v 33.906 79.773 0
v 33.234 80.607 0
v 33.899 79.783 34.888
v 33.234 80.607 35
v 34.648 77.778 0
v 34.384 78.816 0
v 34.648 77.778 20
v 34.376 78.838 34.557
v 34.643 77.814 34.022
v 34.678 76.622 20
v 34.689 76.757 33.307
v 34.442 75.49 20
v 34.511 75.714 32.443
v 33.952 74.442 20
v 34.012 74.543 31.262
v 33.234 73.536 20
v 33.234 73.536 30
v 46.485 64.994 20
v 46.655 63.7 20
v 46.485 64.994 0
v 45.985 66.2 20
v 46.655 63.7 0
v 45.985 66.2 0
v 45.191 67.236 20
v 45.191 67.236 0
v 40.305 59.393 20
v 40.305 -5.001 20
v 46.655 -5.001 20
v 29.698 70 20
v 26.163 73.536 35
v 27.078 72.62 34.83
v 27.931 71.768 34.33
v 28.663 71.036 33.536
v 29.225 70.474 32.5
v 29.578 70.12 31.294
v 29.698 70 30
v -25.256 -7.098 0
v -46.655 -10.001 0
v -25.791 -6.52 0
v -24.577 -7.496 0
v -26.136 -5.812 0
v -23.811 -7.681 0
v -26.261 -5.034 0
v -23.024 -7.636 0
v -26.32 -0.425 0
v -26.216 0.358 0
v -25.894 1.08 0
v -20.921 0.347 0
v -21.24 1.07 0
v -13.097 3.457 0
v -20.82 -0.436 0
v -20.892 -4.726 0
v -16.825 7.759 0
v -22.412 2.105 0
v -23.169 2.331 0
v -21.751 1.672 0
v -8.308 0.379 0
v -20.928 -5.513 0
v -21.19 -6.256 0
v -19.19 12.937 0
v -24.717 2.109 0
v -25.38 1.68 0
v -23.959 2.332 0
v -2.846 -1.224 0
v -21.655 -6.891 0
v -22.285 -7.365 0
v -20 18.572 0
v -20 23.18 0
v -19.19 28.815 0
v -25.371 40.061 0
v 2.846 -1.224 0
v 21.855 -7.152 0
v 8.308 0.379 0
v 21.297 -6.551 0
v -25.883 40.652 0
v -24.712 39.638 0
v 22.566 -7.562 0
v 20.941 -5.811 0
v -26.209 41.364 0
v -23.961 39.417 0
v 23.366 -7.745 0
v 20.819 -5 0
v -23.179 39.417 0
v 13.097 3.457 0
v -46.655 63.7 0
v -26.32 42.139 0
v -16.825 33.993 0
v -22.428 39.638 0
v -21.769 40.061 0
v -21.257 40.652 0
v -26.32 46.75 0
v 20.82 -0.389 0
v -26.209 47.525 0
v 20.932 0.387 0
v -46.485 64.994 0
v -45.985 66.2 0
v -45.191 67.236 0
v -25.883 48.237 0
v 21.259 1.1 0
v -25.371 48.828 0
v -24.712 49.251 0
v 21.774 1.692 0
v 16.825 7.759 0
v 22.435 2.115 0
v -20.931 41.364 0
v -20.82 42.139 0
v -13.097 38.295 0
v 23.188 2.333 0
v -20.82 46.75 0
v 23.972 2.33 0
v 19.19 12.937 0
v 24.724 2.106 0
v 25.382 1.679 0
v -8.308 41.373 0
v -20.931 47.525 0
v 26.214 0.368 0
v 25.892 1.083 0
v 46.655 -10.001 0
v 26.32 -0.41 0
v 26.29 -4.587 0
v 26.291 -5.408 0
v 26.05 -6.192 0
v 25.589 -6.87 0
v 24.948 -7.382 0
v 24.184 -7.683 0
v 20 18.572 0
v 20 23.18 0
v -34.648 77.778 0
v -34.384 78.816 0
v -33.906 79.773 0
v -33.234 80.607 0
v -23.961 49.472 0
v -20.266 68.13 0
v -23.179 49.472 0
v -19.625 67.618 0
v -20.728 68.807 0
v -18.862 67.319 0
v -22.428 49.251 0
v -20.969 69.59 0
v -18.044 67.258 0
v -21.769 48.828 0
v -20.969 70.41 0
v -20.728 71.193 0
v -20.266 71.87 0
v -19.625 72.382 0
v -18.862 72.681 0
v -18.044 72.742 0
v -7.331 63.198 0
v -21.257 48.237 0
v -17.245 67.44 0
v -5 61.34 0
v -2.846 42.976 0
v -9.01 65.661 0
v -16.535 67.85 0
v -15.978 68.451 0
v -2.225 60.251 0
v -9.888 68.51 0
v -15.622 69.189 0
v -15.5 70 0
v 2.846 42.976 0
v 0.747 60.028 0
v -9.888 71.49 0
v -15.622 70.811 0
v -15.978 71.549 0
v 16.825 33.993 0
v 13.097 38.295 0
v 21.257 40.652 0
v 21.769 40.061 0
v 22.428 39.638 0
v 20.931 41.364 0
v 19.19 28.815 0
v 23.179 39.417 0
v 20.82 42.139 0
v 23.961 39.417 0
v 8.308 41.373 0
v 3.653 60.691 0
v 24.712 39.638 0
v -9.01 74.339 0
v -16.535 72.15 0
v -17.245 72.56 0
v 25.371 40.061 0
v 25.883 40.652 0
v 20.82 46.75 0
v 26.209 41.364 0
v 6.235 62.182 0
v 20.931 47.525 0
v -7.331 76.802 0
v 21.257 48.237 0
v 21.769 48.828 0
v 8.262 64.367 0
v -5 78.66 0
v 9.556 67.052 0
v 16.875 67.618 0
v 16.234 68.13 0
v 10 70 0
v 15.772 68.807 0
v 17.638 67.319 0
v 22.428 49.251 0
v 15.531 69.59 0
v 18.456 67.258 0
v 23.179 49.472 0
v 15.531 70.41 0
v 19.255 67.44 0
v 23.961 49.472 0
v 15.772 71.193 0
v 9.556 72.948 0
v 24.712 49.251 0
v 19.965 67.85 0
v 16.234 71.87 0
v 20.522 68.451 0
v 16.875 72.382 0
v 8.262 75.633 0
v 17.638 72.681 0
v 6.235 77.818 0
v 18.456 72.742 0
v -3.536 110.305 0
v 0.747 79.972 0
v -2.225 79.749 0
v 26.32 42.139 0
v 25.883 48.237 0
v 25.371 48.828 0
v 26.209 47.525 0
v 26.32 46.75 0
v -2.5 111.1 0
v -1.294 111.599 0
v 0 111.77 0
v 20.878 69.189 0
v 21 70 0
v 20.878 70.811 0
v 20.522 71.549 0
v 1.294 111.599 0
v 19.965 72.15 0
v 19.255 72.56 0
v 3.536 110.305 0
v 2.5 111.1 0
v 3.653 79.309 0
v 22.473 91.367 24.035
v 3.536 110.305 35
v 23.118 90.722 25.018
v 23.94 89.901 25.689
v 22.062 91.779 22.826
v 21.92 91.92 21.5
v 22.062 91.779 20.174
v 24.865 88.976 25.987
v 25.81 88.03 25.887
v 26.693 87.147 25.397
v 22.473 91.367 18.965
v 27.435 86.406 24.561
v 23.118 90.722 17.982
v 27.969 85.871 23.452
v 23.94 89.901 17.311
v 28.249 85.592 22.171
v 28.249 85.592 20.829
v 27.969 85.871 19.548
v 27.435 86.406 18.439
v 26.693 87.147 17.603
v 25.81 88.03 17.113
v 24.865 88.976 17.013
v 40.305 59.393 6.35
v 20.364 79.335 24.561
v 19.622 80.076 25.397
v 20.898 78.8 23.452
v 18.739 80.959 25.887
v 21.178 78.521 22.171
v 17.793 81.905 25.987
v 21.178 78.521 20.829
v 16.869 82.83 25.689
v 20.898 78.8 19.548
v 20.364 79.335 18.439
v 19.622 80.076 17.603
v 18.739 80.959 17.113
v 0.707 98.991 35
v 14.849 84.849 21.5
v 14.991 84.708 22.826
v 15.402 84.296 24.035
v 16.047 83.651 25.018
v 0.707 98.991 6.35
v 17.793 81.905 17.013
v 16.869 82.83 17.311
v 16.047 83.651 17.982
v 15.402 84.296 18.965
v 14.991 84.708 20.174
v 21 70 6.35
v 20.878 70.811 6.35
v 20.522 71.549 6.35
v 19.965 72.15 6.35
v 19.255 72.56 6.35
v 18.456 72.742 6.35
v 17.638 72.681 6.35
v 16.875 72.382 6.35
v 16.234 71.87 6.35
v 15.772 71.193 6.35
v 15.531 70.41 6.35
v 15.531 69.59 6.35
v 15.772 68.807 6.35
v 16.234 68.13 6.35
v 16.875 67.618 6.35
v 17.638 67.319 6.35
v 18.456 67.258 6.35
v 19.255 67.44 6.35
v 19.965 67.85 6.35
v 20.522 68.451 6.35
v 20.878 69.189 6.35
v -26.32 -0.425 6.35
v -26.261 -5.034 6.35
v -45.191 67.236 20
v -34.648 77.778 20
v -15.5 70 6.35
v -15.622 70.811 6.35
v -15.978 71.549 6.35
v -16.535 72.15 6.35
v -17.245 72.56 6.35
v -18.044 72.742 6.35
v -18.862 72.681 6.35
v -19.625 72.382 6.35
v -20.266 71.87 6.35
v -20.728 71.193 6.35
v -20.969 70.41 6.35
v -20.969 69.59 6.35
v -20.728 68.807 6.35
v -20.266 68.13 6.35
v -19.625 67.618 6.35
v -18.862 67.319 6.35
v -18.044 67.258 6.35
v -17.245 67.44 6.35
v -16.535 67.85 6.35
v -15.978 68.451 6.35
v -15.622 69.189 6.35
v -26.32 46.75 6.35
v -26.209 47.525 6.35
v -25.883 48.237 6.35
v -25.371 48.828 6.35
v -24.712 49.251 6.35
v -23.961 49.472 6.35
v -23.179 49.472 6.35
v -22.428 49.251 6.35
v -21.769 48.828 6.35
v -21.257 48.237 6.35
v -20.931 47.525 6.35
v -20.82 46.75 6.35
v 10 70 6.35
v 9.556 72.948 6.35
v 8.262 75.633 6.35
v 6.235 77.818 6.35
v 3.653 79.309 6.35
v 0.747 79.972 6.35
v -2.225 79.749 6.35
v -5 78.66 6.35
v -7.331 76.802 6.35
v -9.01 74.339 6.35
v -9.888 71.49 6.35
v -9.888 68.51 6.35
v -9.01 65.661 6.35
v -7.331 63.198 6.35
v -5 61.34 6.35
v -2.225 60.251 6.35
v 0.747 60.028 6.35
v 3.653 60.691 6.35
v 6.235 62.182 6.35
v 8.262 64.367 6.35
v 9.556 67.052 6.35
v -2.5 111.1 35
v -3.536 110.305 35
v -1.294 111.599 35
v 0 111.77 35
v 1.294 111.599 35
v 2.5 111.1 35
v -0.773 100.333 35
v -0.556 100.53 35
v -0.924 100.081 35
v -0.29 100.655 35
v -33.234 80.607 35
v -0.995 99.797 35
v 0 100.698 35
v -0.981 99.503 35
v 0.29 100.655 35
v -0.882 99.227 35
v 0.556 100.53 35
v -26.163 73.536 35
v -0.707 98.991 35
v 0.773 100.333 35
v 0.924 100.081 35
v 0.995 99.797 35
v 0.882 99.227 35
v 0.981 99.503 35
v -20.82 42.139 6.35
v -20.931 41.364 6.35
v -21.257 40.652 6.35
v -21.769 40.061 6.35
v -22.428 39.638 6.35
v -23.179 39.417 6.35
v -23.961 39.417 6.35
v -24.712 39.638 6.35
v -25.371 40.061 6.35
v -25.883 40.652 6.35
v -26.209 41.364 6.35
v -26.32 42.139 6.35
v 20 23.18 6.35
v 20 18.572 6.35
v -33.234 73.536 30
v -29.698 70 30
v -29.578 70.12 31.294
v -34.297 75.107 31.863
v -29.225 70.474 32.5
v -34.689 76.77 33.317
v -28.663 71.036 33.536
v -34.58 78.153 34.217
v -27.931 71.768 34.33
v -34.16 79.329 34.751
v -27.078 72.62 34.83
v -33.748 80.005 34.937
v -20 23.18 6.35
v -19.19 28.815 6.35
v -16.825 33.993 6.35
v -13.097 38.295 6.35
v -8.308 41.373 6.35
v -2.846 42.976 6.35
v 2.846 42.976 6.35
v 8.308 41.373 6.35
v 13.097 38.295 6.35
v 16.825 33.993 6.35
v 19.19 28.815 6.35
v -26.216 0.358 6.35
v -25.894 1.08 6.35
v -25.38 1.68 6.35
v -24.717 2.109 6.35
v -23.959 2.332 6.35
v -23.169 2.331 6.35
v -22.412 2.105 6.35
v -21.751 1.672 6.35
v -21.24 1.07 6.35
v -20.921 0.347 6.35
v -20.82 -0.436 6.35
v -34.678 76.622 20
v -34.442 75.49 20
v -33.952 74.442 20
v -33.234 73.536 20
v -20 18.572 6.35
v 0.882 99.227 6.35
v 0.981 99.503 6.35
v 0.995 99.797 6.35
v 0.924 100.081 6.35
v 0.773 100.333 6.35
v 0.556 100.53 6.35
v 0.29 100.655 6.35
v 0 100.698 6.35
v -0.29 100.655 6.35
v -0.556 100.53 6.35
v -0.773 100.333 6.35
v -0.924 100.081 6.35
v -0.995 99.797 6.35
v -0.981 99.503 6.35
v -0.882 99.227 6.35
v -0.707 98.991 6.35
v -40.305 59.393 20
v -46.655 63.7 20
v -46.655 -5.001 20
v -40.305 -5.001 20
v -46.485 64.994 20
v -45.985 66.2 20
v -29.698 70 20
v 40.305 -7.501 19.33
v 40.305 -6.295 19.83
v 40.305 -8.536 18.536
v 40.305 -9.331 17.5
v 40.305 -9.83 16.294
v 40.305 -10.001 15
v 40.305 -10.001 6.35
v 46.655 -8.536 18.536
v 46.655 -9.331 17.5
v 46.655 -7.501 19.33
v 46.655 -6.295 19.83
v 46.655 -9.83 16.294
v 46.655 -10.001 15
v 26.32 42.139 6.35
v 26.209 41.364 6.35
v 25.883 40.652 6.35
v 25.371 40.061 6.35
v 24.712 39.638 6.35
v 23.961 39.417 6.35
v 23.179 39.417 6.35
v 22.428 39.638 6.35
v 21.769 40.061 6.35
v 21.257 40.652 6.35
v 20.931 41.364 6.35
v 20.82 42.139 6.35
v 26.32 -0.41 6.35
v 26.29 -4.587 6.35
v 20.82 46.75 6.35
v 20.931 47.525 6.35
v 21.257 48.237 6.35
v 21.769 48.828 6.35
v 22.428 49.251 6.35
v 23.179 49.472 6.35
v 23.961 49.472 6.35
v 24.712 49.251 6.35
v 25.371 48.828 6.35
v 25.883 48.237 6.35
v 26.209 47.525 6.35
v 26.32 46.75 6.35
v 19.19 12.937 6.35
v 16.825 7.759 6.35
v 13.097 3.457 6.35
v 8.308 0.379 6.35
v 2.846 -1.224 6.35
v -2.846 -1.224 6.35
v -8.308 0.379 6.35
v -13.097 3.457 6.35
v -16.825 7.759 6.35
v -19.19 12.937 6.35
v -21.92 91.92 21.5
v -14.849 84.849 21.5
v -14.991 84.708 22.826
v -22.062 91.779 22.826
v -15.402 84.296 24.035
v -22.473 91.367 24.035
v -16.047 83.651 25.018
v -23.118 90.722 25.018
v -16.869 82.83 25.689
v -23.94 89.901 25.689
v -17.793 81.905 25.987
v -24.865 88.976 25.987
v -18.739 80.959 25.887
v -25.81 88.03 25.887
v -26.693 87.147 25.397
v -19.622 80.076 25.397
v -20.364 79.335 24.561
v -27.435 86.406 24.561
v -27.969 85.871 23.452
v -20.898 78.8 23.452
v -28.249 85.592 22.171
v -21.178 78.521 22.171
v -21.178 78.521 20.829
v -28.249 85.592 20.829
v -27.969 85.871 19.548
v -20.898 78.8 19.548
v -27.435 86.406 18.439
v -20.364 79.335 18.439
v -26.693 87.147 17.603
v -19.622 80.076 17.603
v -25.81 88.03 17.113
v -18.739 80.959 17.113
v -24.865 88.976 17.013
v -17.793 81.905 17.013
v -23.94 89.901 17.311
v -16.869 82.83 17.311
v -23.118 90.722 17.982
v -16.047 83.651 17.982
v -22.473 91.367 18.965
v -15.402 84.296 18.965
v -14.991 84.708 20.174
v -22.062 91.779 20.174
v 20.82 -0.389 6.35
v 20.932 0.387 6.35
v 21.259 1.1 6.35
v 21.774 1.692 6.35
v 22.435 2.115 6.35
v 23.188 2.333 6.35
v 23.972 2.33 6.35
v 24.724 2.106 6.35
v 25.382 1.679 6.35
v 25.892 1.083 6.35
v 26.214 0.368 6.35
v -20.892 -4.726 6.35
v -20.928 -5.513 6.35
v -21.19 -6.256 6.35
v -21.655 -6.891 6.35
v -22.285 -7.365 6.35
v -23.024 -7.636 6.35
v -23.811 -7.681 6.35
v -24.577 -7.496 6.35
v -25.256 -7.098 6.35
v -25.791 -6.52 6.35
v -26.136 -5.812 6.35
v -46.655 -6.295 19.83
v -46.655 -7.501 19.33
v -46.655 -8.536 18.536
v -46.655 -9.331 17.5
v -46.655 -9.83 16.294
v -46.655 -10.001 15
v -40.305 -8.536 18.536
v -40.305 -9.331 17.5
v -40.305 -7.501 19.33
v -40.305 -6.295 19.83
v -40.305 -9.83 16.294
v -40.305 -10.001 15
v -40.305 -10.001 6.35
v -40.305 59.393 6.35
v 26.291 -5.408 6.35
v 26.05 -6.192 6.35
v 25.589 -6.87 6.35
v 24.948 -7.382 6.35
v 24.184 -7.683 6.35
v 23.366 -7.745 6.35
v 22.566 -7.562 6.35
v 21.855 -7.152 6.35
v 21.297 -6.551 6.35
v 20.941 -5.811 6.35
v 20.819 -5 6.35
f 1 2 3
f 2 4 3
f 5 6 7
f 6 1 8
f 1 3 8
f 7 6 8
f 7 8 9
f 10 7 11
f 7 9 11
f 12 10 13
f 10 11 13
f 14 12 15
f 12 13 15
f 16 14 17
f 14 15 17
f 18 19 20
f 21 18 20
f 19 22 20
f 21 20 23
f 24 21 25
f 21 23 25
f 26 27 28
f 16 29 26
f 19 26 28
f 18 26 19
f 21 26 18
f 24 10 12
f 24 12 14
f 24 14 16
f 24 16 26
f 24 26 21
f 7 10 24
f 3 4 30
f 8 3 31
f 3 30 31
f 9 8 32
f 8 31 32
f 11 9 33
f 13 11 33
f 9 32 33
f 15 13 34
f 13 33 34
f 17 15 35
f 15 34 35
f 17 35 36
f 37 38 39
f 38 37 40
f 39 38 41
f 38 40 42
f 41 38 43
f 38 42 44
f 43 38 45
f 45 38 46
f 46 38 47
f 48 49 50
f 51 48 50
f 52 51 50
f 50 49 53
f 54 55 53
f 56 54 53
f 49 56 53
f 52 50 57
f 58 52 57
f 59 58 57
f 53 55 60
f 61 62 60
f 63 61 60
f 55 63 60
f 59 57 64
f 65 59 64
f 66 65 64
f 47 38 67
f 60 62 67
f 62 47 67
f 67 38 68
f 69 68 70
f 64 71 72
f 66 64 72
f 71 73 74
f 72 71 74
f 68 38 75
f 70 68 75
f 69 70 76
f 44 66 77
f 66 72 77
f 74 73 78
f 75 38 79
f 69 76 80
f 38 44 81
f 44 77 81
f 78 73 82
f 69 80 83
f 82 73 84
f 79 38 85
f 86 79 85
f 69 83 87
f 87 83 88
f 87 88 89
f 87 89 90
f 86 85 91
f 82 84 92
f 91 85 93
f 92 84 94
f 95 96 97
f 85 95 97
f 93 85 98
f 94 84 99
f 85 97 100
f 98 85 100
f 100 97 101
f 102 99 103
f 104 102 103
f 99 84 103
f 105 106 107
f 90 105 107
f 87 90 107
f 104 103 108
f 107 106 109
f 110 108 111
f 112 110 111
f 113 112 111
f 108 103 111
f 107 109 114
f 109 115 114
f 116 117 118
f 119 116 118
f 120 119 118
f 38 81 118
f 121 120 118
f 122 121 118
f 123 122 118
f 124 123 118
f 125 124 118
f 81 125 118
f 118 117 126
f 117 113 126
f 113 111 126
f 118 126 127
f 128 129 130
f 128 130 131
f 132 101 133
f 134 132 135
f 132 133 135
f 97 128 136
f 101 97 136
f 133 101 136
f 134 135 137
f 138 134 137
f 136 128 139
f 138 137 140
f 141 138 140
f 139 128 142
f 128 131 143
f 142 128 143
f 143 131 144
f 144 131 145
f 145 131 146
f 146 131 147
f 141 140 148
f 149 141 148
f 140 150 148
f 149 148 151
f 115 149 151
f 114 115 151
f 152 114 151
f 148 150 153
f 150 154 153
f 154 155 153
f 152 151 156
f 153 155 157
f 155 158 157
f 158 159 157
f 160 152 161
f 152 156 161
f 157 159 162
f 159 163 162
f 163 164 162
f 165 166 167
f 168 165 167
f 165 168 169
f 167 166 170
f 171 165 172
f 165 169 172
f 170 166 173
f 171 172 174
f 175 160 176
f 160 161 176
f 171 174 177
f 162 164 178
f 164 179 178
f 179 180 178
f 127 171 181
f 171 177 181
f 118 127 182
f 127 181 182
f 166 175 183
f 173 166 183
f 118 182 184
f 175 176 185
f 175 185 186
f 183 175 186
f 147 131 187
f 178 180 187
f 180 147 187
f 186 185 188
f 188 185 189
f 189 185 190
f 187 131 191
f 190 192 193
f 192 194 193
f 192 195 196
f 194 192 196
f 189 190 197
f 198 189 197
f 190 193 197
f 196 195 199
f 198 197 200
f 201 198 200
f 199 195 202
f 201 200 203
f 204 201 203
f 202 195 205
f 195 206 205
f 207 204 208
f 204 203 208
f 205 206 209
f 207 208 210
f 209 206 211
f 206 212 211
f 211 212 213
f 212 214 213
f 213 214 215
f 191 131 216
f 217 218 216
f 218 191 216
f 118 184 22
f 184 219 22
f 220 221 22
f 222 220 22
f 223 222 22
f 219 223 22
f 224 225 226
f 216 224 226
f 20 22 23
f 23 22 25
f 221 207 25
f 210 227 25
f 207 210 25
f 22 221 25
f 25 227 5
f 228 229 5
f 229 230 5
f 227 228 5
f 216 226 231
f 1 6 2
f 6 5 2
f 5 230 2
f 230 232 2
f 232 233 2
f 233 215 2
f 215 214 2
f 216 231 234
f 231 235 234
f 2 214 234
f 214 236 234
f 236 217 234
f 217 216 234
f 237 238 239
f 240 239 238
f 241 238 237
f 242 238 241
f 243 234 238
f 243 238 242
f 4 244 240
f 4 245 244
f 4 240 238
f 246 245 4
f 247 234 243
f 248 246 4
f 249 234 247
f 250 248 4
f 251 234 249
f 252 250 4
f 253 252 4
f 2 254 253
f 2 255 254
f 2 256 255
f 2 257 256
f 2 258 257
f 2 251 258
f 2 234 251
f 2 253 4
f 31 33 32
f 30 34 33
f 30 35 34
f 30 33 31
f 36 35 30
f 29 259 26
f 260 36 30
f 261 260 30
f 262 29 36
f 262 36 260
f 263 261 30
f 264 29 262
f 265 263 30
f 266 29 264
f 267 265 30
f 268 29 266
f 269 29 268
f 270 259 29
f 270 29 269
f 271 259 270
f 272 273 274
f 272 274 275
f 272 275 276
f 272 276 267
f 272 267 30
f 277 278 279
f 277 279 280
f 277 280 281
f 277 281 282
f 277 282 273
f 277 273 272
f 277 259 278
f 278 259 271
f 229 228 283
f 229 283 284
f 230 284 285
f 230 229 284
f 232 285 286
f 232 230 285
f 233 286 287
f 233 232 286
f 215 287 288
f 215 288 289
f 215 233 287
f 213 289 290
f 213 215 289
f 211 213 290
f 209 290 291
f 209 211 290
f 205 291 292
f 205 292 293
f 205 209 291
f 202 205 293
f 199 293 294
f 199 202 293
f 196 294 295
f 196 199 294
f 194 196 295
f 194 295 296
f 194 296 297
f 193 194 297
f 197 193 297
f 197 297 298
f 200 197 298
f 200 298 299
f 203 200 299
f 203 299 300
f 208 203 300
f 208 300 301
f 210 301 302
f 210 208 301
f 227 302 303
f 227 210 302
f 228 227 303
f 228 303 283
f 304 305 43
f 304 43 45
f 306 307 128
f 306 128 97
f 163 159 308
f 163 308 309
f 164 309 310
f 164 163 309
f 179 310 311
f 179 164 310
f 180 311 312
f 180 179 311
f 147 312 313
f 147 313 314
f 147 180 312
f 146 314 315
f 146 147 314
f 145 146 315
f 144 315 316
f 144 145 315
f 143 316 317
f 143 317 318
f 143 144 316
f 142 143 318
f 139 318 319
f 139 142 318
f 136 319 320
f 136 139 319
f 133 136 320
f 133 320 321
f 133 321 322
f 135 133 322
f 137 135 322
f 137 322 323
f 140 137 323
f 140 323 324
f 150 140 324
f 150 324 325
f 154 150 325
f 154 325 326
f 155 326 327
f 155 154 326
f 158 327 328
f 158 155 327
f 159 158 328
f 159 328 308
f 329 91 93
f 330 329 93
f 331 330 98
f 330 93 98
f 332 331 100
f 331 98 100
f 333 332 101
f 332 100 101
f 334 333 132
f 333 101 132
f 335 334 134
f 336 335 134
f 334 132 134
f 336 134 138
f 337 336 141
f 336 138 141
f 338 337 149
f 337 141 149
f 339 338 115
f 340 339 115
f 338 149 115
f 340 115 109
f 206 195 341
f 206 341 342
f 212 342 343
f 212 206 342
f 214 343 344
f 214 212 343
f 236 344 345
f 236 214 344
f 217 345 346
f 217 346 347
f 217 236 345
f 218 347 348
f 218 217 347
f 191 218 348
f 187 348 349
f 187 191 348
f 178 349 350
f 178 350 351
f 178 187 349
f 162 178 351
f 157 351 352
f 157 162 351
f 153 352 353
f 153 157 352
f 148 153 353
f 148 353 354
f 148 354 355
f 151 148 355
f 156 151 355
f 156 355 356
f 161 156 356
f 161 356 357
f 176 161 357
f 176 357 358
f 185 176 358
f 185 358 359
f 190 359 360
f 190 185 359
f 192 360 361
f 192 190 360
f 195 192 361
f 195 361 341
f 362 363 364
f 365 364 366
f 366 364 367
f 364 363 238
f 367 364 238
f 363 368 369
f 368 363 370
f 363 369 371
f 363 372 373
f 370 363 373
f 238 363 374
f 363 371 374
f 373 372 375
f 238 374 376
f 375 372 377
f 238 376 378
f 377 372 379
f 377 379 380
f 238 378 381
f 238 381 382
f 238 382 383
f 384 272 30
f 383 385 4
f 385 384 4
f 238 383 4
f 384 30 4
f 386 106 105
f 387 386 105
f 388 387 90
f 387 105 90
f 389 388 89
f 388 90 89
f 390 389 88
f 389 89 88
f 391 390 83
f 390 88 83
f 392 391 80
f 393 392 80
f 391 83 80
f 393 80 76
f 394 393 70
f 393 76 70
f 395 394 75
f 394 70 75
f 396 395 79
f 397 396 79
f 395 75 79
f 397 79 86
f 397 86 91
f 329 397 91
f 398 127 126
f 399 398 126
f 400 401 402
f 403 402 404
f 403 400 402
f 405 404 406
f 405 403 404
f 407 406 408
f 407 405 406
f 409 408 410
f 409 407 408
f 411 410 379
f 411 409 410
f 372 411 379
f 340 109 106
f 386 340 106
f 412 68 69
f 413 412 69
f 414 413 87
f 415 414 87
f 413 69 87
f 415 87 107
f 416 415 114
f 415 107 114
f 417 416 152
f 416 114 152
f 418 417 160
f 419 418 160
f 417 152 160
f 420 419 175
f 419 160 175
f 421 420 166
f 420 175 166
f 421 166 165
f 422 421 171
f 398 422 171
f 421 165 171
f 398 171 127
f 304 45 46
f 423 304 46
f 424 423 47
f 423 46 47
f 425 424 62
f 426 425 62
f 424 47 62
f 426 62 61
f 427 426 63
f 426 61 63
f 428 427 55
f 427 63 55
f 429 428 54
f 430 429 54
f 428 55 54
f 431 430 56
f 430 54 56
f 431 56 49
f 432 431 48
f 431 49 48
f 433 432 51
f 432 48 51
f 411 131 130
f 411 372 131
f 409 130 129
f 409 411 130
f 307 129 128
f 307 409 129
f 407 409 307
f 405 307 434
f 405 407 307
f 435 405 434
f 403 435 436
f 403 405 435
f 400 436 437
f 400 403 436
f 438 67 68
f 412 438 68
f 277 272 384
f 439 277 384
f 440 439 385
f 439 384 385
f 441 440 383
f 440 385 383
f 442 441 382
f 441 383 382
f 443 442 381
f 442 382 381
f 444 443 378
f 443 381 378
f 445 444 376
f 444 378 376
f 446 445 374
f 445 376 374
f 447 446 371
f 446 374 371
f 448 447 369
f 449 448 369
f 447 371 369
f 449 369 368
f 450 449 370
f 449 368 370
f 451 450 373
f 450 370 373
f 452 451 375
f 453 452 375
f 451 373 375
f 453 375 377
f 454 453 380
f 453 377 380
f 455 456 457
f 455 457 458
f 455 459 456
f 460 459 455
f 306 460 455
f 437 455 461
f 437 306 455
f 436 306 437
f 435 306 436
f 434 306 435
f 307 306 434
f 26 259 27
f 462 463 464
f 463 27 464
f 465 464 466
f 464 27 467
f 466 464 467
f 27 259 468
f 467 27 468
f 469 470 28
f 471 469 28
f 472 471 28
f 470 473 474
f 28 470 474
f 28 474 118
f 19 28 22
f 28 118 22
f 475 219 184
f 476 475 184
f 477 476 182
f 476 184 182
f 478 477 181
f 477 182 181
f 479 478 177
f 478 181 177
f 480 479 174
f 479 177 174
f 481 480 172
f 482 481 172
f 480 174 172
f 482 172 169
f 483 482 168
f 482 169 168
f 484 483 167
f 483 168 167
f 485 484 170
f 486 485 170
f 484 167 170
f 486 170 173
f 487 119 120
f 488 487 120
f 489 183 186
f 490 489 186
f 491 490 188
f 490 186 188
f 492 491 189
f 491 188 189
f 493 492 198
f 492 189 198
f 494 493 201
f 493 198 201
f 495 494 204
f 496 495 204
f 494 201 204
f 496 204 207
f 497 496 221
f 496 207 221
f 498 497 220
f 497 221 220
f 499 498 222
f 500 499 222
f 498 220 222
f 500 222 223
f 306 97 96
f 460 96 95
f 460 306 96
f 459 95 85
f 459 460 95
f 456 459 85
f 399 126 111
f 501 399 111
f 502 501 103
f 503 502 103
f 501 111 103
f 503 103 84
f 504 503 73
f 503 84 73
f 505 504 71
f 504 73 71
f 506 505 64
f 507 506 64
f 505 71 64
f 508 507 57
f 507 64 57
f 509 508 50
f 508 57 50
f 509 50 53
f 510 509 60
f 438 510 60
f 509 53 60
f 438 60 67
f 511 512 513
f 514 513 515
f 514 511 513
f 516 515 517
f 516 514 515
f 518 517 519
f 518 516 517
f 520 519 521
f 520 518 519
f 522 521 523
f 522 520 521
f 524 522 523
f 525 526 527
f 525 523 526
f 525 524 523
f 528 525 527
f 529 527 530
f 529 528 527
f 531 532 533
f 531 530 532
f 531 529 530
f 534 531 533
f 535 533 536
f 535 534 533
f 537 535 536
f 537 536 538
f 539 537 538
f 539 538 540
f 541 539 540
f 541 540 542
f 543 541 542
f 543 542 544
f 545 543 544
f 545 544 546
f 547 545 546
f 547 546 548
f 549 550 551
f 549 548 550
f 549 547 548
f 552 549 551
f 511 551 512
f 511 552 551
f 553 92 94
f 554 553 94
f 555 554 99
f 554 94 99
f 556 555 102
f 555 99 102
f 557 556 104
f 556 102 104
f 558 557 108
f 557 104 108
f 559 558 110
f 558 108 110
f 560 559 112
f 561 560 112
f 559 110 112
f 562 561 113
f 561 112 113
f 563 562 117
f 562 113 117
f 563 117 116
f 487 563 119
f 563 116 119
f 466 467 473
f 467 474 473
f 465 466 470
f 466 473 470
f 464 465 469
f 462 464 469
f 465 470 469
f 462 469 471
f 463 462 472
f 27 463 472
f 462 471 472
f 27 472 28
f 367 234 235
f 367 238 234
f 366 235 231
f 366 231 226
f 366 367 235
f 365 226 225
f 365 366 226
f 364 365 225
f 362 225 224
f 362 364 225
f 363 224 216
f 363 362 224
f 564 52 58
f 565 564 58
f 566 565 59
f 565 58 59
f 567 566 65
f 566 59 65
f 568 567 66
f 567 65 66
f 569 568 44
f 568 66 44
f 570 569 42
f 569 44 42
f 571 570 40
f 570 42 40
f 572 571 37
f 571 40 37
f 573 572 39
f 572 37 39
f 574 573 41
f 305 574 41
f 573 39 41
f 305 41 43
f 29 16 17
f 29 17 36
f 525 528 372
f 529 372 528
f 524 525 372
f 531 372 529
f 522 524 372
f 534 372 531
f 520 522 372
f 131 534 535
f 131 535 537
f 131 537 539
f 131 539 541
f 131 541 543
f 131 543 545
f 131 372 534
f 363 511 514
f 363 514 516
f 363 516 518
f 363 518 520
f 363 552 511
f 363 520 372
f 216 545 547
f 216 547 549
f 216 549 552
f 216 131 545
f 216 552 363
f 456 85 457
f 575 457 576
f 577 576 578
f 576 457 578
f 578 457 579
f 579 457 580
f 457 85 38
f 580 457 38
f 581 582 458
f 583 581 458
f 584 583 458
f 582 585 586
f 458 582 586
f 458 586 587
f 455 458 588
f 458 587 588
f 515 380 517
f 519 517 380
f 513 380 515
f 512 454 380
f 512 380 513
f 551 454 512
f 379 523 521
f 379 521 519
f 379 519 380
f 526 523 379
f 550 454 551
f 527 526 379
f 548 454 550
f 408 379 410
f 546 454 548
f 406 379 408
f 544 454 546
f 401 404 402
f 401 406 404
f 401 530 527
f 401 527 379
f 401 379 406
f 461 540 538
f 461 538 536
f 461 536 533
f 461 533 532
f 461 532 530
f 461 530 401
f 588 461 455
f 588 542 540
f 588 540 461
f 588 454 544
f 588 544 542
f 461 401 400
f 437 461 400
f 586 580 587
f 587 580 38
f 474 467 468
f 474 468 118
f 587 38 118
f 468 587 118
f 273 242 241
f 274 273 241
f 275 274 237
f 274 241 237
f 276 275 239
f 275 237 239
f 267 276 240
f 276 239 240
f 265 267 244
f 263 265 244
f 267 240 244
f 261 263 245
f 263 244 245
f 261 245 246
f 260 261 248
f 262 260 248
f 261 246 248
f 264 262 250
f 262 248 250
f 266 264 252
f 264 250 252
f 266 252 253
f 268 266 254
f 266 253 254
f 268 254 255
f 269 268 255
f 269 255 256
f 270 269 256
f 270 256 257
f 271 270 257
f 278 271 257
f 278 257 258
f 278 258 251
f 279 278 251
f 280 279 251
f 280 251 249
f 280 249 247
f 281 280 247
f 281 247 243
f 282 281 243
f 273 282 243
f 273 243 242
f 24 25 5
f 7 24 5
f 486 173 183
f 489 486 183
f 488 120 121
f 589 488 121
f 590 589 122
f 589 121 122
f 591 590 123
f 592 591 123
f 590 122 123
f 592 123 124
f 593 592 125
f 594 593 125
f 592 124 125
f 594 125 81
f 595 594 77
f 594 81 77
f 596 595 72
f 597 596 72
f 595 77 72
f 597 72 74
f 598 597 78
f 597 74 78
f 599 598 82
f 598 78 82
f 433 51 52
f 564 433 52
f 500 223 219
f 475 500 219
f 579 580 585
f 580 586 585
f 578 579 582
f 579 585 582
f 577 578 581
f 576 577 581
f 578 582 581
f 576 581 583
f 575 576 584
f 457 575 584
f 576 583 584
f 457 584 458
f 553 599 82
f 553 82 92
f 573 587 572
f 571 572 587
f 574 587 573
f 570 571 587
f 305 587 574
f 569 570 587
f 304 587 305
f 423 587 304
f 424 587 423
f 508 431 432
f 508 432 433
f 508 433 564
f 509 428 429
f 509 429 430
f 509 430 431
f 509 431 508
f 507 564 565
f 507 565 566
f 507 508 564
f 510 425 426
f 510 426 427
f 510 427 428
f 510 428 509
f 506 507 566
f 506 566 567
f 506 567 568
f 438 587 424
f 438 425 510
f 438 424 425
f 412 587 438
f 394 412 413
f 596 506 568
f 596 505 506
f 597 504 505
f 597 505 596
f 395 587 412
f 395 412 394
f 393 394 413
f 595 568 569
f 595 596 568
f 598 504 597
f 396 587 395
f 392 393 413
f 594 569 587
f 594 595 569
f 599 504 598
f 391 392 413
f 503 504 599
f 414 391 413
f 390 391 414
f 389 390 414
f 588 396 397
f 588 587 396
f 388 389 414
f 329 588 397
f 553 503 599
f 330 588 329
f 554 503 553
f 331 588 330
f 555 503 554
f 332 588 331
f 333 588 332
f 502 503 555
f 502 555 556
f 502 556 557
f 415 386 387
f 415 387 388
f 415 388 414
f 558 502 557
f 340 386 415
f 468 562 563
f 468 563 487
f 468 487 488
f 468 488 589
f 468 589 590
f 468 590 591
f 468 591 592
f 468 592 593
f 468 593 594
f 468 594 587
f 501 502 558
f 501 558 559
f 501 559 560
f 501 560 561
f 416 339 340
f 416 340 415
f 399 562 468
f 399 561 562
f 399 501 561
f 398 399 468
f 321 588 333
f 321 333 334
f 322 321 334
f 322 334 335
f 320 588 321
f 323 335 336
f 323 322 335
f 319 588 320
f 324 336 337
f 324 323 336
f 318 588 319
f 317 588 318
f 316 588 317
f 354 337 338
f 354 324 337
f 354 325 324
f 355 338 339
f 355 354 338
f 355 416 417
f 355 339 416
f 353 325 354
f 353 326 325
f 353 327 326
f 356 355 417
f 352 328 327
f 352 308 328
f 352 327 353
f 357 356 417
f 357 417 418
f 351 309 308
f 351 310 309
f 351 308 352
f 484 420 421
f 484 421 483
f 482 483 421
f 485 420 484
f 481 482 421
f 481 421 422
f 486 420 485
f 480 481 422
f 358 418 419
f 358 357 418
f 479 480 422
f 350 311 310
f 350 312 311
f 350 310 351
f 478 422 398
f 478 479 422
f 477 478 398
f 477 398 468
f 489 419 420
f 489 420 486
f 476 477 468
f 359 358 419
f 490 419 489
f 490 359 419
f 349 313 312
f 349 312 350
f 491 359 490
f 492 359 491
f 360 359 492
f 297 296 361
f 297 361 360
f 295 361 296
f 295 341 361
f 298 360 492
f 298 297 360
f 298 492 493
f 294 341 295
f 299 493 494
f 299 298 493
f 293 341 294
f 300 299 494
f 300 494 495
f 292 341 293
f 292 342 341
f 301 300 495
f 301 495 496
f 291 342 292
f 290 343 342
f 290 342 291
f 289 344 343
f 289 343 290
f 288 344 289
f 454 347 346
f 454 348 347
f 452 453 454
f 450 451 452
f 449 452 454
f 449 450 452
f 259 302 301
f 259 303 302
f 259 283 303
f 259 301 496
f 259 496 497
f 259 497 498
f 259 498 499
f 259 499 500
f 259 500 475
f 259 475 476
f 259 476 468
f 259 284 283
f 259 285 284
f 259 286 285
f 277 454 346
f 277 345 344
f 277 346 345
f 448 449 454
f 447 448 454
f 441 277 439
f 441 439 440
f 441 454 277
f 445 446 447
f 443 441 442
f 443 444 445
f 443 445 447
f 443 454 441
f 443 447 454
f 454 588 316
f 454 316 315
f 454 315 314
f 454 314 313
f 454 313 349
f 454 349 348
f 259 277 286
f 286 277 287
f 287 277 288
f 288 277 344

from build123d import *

# Parameters (mm, degrees)
F0_R      = 2.75
F0_R_2    = 10
F1_DEPTH  = 6.35
F3_DEPTH  = 6.35
F4_DEPTH  = 20
F6_DEPTH  = 35
F7_R      = 4.5
F8_DEPTH  = 12.6
F9_R      = 5
F10_R     = 1
F11_DEPTH = 28.65


# Not quite as in the source:
# - a feature names something its author has since deleted; it is built from what else it names


with BuildPart() as f1:
    # F0 (on Top) → F1 (new body)
    with BuildSketch(Plane.XY):
        Polygon((0, 99.6984848098), (-29.6984848098, 70), (-29.6984848098, -10.0008162295), (29.6984848098, -10.0008162295), (29.6984848098, 70), align=None)
        with BuildLine():
            Line((-26.2613506757, -5.0341163975), (-26.3197790794, -0.4248570541))
            ThreePointArc((-26.3197790794, -0.4248570541), (-23.5643542567, 2.3599942046), (-20.8203872227, -0.436147316))
            Line((-20.8203872227, -0.436147316), (-20.892389105, -4.7262623825))
            ThreePointArc((-20.892389105, -4.7262623825), (-23.4159197643, -7.6871530789), (-26.2613506757, -5.0341163975))
        make_face(mode=Mode.SUBTRACT)
        with BuildLine():
            ThreePointArc((-26.32, 46.75), (-23.57, 49.5), (-20.82, 46.75))
            Line((-20.82, 46.75), (-20.82, 42.1391243117))
            ThreePointArc((-20.82, 42.1391243117), (-23.57, 39.3891243117), (-26.32, 42.1391243117))
            Line((-26.32, 42.1391243117), (-26.32, 46.75))
        make_face(mode=Mode.SUBTRACT)
        with BuildLine():
            ThreePointArc((-20, 23.18), (0, 43.18), (20, 23.18))
            Line((20, 23.18), (20, 18.572))
            ThreePointArc((20, 18.572), (0, -1.428), (-20, 18.572))
            Line((-20, 18.572), (-20, 23.18))
        make_face(mode=Mode.SUBTRACT)
        with BuildLine():
            ThreePointArc((20.820000121, -0.3891841763), (23.5802388964, 2.359980939), (26.3199297103, -0.409661849))
            Line((26.3199297103, -0.409661849), (26.290062332, -4.5869490924))
            ThreePointArc((26.290062332, -4.5869490924), (23.7771177689, -7.7443772963), (20.8186322617, -5))
            Line((20.8186322617, -5), (20.820000121, -0.3891841763))
        make_face(mode=Mode.SUBTRACT)
        with BuildLine():
            Line((20.82, 42.1391243117), (20.82, 46.75))
            ThreePointArc((20.82, 46.75), (23.57, 49.5), (26.32, 46.75))
            Line((26.32, 46.75), (26.32, 42.1391243117))
            ThreePointArc((26.32, 42.1391243117), (23.57, 39.3891243117), (20.82, 42.1391243117))
        make_face(mode=Mode.SUBTRACT)
        with Locations((-18.25, 70)):
            Circle(F0_R, mode=Mode.SUBTRACT)
        with Locations((0, 70)):
            Circle(F0_R_2, mode=Mode.SUBTRACT)
        with Locations((18.25, 70)):
            Circle(F0_R, mode=Mode.SUBTRACT)
    extrude(amount=F1_DEPTH)

    # F2 (on Top) → F3 (join)
    with BuildSketch(Plane.XY):
        Polygon((-29.6984848098, 70), (0, 99.6984848098), (0, 112.4264068712), (-46.6550865276, 65.7713203436), (-46.6550865276, 53.0433982822), (-40.3050865276, 59.3933982822), align=None)
        Polygon((-29.6984848098, -10.0008162295), (-29.6984848098, 70), (-40.3050865276, 59.3933982822), (-40.3050865276, -10.0008162295), align=None)
        Polygon((-40.3050865276, -10.0008162295), (-40.3050865276, 59.3933982822), (-46.6550865276, 53.0433982822), (-46.6550865276, -10.0008162295), align=None)
        Polygon((40.3050865276, 59.3933982822), (29.6984848098, 70), (29.6984848098, -10.0008162295), (40.3050865276, -10.0008162295), align=None)
        Polygon((46.6550865276, 53.0433982822), (40.3050865276, 59.3933982822), (40.3050865276, -10.0008162295), (46.6550865276, -10.0008162295), align=None)
        Polygon((0, 112.4264068712), (0, 99.6984848098), (29.6984848098, 70), (40.3050865276, 59.3933982822), (46.6550865276, 53.0433982822), (46.6550865276, 65.7713203436), align=None)
    extrude(amount=F3_DEPTH)

    # F2 (on Top) → F4 (join)
    with BuildSketch(Plane.XY):
        Polygon((46.6550865276, 53.0433982822), (40.3050865276, 59.3933982822), (40.3050865276, -10.0008162295), (46.6550865276, -10.0008162295), align=None)
        Polygon((-40.3050865276, -10.0008162295), (-40.3050865276, 59.3933982822), (-46.6550865276, 53.0433982822), (-46.6550865276, -10.0008162295), align=None)
        Polygon((0, 112.4264068712), (0, 99.6984848098), (29.6984848098, 70), (40.3050865276, 59.3933982822), (46.6550865276, 53.0433982822), (46.6550865276, 65.7713203436), align=None)
        Polygon((-29.6984848098, 70), (0, 99.6984848098), (0, 112.4264068712), (-46.6550865276, 65.7713203436), (-46.6550865276, 53.0433982822), (-40.3050865276, 59.3933982822), align=None)
    extrude(amount=F4_DEPTH)

    # F5 (on face) → F6 (join)
    with BuildSketch(Plane(origin=(0, 0, 0), x_dir=(1, 0, 0), z_dir=(0, 0, -1))):
        Polygon((0, -99.6984848098), (-29.6984848098, -70), (-36.7695526217, -77.0710678119), (-5.8406204336, -108), (0, -113.8406204336), (5.8406204336, -108), (36.7695526217, -77.0710678119), (29.6984848098, -70), align=None)
    extrude(amount=-F6_DEPTH)

    # F9 (call 1 of 7: OpenCascade refuses the feature's edges together)
    f9_edges = [f1.edges().sort_by_distance(p)[0] for p in [
        (33.234019, 73.535534, 35),
        (36.769553, 77.071068, 17.5),
    ]]
    fillet(f9_edges, radius=F9_R)

    # F9#2 (call 2 of 7)
    f9_2_edges = [f1.edges().sort_by_distance(p)[0] for p in [
        (-33.234019, 73.535534, 35),
        (-36.769553, 77.071068, 17.5),
    ]]
    fillet(f9_2_edges, radius=F9_R)

    # F9#3 (call 3 of 7)
    f9_3_edges = [f1.edges().sort_by_distance(p)[0] for p in [
        (43.480087, -10.000816, 20),
    ]]
    fillet(f9_3_edges, radius=F9_R)

    # F9#4 (call 4 of 7)
    f9_4_edges = [f1.edges().sort_by_distance(p)[0] for p in [
        (-43.480087, -10.000816, 20),
    ]]
    fillet(f9_4_edges, radius=F9_R)

    # F9#5 (call 5 of 7)
    f9_5_edges = [f1.edges().sort_by_distance(p)[0] for p in [
        (46.655087, 65.77132, 10),
    ]]
    fillet(f9_5_edges, radius=F9_R)

    # F9#6 (call 6 of 7)
    f9_6_edges = [f1.edges().sort_by_distance(p)[0] for p in [
        (0, 113.84062, 17.5),
    ]]
    fillet(f9_6_edges, radius=F9_R)

    # F9#7 (call 7 of 7)
    f9_7_edges = [f1.edges().sort_by_distance(p)[0] for p in [
        (-46.655087, 65.77132, 10),
    ]]
    fillet(f9_7_edges, radius=F9_R)

    # F10 (on face) → F11 (cut, through all)
    with BuildSketch(Plane.XY.offset(35)):
        with Locations((0, 99.6984848098)):
            Circle(F10_R)
    extrude(amount=-F11_DEPTH, mode=Mode.SUBTRACT)


with BuildPart() as f8:
    # F7 (on face) → F8 (new body)
    with BuildSketch(Plane(origin=(56.9203102168, 56.9203102168, 0), x_dir=(-0.7071067812, 0.7071067812, 0), z_dir=(0.7071067812, 0.7071067812, 0))):
        with Locations((44.9974746831, 21.5)):
            Circle(F7_R)
    extrude(amount=-F8_DEPTH)


with BuildPart() as f12_1:
    # F12: instance of F8
    add(f8.part.mirror(Plane.YZ))


with BuildPart() as f1_1:
    add(f1.part)

    # F13: cut F12_1, F8
    add(f12_1.part, mode=Mode.SUBTRACT)
    add(f8.part, mode=Mode.SUBTRACT)


solid = f1_1.part
